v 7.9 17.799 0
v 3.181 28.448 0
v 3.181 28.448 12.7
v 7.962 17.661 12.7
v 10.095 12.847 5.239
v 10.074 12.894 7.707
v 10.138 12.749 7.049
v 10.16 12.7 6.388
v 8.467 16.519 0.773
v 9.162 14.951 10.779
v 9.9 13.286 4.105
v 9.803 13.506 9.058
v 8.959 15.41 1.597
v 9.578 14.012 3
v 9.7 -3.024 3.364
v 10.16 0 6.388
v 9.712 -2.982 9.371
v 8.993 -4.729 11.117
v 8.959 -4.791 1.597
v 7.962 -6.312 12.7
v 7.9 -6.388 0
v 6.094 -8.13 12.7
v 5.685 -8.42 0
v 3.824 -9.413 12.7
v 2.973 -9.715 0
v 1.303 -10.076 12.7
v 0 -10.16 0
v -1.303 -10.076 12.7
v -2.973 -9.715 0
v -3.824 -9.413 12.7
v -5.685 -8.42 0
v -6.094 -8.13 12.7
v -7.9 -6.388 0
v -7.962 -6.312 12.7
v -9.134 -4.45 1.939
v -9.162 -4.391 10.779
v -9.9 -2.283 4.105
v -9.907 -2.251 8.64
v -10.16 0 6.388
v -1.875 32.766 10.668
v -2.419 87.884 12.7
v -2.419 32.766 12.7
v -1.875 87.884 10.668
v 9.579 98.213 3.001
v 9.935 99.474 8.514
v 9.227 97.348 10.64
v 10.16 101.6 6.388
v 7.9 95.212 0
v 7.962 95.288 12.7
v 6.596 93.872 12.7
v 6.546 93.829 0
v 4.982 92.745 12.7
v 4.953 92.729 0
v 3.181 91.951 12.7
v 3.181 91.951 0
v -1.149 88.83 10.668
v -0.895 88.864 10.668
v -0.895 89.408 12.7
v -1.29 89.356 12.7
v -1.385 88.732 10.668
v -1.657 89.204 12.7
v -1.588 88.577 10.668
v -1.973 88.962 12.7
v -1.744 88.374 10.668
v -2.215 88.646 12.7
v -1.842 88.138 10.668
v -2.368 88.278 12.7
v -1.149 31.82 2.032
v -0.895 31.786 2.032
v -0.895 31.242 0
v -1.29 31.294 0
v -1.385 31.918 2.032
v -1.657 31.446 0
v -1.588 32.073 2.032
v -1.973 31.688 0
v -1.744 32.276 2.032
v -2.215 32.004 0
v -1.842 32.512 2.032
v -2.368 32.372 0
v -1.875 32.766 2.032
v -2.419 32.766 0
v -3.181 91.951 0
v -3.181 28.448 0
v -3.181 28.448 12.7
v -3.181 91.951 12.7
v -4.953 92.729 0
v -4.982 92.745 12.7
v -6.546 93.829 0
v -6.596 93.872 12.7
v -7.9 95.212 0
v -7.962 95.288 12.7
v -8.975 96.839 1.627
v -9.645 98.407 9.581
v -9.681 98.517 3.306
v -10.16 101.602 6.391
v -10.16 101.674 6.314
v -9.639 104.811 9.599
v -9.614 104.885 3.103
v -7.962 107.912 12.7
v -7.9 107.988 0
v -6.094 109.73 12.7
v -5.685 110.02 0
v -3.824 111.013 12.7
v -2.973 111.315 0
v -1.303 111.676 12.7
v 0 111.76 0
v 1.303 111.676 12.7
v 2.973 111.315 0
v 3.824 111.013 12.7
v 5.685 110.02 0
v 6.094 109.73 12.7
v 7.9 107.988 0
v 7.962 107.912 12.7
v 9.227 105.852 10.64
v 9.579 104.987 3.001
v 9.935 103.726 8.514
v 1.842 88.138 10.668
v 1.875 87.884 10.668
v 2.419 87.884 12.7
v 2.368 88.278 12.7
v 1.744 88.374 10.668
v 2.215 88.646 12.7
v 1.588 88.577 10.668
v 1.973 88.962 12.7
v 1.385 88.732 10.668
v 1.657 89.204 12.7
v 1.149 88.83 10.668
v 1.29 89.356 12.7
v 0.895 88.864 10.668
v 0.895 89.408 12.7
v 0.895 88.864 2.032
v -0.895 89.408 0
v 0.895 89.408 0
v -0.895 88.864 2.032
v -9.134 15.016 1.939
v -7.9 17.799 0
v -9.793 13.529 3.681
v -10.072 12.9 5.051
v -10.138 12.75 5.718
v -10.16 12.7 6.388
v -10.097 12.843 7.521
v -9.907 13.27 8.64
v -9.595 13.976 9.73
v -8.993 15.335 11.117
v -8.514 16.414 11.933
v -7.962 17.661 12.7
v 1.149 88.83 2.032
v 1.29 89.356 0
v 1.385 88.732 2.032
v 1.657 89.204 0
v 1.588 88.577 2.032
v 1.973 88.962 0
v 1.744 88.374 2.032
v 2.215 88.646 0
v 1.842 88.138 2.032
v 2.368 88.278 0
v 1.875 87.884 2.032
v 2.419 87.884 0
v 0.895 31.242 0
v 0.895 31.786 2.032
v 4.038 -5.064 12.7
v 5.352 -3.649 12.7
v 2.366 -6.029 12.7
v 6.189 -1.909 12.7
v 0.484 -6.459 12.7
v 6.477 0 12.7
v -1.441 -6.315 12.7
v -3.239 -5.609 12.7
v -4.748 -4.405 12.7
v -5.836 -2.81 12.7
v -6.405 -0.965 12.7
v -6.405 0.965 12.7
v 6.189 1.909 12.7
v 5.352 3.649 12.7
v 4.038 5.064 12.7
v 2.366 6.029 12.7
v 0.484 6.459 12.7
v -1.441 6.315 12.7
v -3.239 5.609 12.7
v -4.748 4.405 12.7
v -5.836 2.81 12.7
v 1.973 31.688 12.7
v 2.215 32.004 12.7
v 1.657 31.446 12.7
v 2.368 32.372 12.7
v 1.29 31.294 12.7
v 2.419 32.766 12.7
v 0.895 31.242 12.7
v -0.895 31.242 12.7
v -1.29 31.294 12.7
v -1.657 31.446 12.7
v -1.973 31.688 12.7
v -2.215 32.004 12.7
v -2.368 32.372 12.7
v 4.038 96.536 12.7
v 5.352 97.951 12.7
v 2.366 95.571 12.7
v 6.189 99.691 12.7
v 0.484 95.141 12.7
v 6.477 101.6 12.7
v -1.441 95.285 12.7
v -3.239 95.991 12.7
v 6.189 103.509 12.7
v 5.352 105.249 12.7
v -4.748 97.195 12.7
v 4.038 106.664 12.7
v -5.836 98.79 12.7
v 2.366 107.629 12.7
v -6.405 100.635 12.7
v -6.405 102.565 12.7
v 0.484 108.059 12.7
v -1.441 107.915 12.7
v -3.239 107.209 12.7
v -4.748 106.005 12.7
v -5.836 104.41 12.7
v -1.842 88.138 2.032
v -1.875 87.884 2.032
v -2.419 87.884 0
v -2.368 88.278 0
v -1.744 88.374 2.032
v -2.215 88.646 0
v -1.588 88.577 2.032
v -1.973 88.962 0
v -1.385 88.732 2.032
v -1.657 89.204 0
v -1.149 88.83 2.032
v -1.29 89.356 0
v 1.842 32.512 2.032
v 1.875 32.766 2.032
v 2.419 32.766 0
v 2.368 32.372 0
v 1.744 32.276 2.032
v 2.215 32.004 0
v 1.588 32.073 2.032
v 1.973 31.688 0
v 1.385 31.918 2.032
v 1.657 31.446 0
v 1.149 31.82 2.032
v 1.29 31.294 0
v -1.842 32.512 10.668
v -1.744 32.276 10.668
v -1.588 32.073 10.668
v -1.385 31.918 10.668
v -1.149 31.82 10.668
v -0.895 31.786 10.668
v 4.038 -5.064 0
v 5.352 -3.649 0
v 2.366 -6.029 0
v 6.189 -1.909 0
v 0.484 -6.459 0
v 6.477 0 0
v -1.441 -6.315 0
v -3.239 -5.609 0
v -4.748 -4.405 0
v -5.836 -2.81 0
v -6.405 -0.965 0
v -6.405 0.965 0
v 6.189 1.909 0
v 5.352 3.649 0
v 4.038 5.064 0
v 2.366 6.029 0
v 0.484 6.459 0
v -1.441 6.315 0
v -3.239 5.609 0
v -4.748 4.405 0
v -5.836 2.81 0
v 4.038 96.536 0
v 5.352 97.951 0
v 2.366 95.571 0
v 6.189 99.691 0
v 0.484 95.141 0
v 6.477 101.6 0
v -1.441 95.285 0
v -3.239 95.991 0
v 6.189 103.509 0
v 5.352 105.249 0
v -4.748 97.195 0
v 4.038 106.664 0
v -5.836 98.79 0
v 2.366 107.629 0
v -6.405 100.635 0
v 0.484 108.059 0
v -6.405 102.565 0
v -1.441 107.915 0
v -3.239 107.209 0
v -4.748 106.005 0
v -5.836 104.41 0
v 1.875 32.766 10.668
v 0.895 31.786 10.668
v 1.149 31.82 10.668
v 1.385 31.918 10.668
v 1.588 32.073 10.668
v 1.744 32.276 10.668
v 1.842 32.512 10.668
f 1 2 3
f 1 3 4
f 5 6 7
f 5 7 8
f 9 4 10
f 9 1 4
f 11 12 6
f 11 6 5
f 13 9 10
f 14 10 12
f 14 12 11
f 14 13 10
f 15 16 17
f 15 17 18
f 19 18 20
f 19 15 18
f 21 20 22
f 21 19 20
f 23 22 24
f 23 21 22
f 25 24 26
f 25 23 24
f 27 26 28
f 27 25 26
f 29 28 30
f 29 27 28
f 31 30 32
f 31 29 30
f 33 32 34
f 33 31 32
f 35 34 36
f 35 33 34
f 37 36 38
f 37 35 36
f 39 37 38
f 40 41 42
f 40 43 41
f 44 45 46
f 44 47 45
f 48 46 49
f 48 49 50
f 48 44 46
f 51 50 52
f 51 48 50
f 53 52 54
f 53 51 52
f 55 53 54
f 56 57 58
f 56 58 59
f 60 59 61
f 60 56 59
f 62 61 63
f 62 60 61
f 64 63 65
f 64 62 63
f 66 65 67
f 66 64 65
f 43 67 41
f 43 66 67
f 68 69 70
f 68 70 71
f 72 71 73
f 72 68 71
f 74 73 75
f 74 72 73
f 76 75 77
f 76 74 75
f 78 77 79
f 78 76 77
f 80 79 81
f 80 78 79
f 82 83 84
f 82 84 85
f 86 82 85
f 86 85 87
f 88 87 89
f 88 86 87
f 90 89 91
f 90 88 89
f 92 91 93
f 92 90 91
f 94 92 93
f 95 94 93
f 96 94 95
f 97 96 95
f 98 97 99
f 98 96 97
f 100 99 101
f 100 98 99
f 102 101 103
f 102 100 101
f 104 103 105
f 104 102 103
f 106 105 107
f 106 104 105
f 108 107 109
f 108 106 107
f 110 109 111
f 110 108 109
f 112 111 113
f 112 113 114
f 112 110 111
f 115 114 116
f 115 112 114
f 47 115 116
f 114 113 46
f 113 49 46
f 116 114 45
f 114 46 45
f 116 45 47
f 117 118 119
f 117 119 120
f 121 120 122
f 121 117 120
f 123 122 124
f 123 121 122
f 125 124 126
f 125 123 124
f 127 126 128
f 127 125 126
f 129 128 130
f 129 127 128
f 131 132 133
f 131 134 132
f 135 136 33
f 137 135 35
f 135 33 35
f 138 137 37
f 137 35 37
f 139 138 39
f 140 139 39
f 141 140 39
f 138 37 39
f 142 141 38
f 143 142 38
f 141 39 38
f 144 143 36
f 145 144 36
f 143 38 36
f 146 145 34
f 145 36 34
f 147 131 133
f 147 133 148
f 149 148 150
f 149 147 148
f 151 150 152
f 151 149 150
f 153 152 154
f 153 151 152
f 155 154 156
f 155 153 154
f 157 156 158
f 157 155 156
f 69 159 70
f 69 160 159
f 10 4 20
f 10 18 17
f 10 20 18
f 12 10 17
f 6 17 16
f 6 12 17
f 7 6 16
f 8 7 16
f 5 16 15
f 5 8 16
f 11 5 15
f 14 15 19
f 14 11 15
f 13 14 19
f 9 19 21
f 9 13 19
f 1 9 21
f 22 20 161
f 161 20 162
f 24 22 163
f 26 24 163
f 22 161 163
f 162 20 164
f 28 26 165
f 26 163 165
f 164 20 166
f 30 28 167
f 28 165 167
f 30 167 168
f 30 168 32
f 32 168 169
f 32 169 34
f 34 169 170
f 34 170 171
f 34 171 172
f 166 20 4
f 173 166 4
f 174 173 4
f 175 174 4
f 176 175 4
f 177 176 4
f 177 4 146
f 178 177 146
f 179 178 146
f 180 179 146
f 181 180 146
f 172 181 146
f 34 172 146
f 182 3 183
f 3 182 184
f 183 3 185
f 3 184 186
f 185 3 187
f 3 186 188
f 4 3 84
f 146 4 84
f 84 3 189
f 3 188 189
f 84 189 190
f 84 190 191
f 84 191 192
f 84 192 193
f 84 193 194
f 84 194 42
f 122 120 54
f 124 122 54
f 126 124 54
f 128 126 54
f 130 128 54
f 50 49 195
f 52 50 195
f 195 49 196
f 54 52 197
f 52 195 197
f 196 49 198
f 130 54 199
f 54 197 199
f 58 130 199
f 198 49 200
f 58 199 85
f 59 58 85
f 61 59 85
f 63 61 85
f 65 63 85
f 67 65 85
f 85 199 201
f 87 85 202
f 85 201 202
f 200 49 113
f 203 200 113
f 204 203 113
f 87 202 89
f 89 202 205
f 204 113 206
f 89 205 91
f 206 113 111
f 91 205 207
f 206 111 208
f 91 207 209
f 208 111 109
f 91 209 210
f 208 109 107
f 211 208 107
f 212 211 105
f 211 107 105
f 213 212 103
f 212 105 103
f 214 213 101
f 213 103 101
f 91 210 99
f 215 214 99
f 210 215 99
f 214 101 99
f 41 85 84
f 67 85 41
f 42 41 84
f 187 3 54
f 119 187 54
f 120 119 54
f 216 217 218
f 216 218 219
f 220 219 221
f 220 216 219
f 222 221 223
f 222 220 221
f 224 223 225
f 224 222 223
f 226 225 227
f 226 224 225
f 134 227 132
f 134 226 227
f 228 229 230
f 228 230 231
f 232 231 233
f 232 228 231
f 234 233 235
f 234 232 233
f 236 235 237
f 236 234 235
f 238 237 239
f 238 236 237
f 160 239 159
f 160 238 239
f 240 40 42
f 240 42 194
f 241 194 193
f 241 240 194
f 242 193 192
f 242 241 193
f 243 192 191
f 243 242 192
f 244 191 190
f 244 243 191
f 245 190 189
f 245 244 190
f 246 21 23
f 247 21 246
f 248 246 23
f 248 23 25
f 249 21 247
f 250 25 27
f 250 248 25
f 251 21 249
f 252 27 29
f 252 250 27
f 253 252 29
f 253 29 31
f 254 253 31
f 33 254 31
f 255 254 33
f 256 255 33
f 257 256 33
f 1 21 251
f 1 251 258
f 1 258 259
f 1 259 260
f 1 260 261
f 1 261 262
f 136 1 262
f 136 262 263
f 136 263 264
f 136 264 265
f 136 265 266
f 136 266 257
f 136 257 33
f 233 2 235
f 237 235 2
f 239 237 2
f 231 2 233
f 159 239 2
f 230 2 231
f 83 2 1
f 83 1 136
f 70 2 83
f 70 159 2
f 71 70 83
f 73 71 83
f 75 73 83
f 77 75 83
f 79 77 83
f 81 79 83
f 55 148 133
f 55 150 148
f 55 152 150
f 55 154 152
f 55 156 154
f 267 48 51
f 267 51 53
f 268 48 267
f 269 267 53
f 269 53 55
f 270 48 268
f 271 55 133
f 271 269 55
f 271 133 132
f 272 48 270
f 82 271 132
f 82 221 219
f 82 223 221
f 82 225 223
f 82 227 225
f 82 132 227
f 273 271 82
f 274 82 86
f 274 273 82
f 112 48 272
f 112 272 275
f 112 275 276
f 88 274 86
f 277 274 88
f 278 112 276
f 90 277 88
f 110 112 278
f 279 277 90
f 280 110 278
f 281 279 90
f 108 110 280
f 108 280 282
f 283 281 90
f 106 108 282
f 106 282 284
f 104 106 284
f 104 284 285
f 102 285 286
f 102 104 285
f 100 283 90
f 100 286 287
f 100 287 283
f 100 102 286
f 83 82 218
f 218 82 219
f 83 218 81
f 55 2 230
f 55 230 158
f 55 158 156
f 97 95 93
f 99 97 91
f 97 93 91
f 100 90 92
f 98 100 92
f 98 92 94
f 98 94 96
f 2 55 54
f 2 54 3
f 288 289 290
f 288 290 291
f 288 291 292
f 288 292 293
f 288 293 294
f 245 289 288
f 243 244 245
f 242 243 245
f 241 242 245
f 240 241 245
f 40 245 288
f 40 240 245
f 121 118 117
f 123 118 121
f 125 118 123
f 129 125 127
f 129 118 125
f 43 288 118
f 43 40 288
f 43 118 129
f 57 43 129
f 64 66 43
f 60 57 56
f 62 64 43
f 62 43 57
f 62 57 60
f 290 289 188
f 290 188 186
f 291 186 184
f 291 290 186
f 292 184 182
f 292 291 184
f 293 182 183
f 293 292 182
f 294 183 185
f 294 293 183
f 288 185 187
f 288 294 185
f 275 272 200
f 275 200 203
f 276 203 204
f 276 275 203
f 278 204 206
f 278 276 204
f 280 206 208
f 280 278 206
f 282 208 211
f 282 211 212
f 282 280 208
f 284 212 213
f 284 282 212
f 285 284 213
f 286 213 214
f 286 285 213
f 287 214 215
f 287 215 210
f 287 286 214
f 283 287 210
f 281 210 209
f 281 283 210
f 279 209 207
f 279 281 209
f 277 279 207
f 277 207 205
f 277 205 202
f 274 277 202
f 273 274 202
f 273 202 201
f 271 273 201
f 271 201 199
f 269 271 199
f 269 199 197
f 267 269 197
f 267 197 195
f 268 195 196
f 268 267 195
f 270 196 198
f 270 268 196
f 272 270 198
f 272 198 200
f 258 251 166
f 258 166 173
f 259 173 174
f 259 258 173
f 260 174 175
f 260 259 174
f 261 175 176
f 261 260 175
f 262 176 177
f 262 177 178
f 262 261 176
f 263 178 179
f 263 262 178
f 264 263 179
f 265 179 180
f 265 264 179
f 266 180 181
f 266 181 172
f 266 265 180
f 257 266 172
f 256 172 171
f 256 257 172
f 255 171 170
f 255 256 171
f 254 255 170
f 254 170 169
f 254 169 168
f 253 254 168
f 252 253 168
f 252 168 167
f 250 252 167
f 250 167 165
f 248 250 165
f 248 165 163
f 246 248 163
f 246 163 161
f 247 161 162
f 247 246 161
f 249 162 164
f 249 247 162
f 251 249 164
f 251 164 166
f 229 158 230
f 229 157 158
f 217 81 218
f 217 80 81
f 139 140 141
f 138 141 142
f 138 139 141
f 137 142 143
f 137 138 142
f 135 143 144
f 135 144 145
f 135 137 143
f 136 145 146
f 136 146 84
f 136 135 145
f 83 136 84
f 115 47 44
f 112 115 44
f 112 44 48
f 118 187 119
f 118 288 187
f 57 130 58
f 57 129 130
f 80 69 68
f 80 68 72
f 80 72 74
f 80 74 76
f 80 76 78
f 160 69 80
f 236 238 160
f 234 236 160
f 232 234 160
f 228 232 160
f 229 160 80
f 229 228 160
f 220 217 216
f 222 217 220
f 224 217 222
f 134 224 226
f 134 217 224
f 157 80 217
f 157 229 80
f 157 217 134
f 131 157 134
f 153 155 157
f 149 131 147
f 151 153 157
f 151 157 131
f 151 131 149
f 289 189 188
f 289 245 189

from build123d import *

# Parameters (mm, degrees)
SKETCH1_R               = 6.477
BOSS_EXTRUDE2_DEPTH     = 12.7
CUT_EXTRUDE1_DEPTH      = 2.032
CUT_EXTRUDE1_TAPER      = 15
CUT_EXTRUDE2_DEPTH      = 2.032
CUT_EXTRUDE2_TAPER      = 15
SKETCH6_R               = 15.308441
SKETCH6_R_2             = 10.16
CUT_EXTRUDE3_DEPTH      = 112.76
CUT_EXTRUDE3_DEPTH_BACK = 11.16


with BuildPart() as part:
    # Sketch1 → Boss-Extrude2 (new body)
    with BuildSketch(Plane.XY):
        with BuildLine():
            Line((-10.16, 0), (-10.16, 12.7))
            Line((-10.16, 12.7), (-3.181447, 28.448))
            Line((-3.181447, 28.448), (-3.181447, 91.950959))
            ThreePointArc((-3.181447, 91.950959), (0, 111.76), (3.181447, 91.950959))
            Line((3.181447, 91.950959), (3.181447, 28.448))
            Line((3.181447, 28.448), (10.16, 12.7))
            Line((10.16, 12.7), (10.16, 0))
            ThreePointArc((10.16, 0), (0, -10.16), (-10.16, 0))
        make_face()
        Circle(SKETCH1_R, mode=Mode.SUBTRACT)
        with Locations((0, 101.6)):
            Circle(SKETCH1_R, mode=Mode.SUBTRACT)
    extrude(amount=BOSS_EXTRUDE2_DEPTH)

    # Sketch3 → Cut-Extrude1 (cut)
    with BuildSketch(Plane.XY.offset(12.7)):
        with BuildLine():
            ThreePointArc((-0.895447, 89.408), (-1.973078, 88.961631), (-2.419447, 87.884))
            Line((-2.419447, 87.884), (-2.419447, 32.766))
            ThreePointArc((-2.419447, 32.766), (-1.973078, 31.688369), (-0.895447, 31.242))
            Line((-0.895447, 31.242), (0.895447, 31.242))
            ThreePointArc((0.895447, 31.242), (1.973078, 31.688369), (2.419447, 32.766))
            Line((2.419447, 32.766), (2.419447, 87.884))
            ThreePointArc((2.419447, 87.884), (1.973078, 88.961631), (0.895447, 89.408))
            Line((0.895447, 89.408), (-0.895447, 89.408))
        make_face()
    extrude(amount=-CUT_EXTRUDE1_DEPTH, taper=CUT_EXTRUDE1_TAPER, mode=Mode.SUBTRACT)

    # Sketch5 → Cut-Extrude2 (cut)
    with BuildSketch(Plane(origin=(0, 0, 0), x_dir=(-1, 0, 0), z_dir=(0, 0, -1))):
        with BuildLine():
            ThreePointArc((-0.895447, 89.408), (-1.973078, 88.961631), (-2.419447, 87.884))
            Line((-2.419447, 87.884), (-2.419447, 32.766))
            ThreePointArc((-2.419447, 32.766), (-1.973078, 31.688369), (-0.895447, 31.242))
            Line((-0.895447, 31.242), (0.895447, 31.242))
            ThreePointArc((0.895447, 31.242), (1.973078, 31.688369), (2.419447, 32.766))
            Line((2.419447, 32.766), (2.419447, 87.884))
            ThreePointArc((2.419447, 87.884), (1.973078, 88.961631), (0.895447, 89.408))
            Line((0.895447, 89.408), (-0.895447, 89.408))
        make_face()
    extrude(amount=-CUT_EXTRUDE2_DEPTH, taper=CUT_EXTRUDE2_TAPER, mode=Mode.SUBTRACT)

    # Sketch6 → Cut-Extrude3 (cut, two sides)
    with BuildSketch(Plane(origin=(0, 0, 0), x_dir=(1, 0, 0), z_dir=(0, 1, 0))) as cut_extrude3_sk:
        with Locations((0, -6.388373)):
            Circle(SKETCH6_R)
        with Locations((0, -6.388373)):
            Circle(SKETCH6_R_2, mode=Mode.SUBTRACT)
    extrude(amount=CUT_EXTRUDE3_DEPTH, mode=Mode.SUBTRACT)
    extrude(cut_extrude3_sk.sketch, amount=-CUT_EXTRUDE3_DEPTH_BACK, mode=Mode.SUBTRACT)


solid = part.part
